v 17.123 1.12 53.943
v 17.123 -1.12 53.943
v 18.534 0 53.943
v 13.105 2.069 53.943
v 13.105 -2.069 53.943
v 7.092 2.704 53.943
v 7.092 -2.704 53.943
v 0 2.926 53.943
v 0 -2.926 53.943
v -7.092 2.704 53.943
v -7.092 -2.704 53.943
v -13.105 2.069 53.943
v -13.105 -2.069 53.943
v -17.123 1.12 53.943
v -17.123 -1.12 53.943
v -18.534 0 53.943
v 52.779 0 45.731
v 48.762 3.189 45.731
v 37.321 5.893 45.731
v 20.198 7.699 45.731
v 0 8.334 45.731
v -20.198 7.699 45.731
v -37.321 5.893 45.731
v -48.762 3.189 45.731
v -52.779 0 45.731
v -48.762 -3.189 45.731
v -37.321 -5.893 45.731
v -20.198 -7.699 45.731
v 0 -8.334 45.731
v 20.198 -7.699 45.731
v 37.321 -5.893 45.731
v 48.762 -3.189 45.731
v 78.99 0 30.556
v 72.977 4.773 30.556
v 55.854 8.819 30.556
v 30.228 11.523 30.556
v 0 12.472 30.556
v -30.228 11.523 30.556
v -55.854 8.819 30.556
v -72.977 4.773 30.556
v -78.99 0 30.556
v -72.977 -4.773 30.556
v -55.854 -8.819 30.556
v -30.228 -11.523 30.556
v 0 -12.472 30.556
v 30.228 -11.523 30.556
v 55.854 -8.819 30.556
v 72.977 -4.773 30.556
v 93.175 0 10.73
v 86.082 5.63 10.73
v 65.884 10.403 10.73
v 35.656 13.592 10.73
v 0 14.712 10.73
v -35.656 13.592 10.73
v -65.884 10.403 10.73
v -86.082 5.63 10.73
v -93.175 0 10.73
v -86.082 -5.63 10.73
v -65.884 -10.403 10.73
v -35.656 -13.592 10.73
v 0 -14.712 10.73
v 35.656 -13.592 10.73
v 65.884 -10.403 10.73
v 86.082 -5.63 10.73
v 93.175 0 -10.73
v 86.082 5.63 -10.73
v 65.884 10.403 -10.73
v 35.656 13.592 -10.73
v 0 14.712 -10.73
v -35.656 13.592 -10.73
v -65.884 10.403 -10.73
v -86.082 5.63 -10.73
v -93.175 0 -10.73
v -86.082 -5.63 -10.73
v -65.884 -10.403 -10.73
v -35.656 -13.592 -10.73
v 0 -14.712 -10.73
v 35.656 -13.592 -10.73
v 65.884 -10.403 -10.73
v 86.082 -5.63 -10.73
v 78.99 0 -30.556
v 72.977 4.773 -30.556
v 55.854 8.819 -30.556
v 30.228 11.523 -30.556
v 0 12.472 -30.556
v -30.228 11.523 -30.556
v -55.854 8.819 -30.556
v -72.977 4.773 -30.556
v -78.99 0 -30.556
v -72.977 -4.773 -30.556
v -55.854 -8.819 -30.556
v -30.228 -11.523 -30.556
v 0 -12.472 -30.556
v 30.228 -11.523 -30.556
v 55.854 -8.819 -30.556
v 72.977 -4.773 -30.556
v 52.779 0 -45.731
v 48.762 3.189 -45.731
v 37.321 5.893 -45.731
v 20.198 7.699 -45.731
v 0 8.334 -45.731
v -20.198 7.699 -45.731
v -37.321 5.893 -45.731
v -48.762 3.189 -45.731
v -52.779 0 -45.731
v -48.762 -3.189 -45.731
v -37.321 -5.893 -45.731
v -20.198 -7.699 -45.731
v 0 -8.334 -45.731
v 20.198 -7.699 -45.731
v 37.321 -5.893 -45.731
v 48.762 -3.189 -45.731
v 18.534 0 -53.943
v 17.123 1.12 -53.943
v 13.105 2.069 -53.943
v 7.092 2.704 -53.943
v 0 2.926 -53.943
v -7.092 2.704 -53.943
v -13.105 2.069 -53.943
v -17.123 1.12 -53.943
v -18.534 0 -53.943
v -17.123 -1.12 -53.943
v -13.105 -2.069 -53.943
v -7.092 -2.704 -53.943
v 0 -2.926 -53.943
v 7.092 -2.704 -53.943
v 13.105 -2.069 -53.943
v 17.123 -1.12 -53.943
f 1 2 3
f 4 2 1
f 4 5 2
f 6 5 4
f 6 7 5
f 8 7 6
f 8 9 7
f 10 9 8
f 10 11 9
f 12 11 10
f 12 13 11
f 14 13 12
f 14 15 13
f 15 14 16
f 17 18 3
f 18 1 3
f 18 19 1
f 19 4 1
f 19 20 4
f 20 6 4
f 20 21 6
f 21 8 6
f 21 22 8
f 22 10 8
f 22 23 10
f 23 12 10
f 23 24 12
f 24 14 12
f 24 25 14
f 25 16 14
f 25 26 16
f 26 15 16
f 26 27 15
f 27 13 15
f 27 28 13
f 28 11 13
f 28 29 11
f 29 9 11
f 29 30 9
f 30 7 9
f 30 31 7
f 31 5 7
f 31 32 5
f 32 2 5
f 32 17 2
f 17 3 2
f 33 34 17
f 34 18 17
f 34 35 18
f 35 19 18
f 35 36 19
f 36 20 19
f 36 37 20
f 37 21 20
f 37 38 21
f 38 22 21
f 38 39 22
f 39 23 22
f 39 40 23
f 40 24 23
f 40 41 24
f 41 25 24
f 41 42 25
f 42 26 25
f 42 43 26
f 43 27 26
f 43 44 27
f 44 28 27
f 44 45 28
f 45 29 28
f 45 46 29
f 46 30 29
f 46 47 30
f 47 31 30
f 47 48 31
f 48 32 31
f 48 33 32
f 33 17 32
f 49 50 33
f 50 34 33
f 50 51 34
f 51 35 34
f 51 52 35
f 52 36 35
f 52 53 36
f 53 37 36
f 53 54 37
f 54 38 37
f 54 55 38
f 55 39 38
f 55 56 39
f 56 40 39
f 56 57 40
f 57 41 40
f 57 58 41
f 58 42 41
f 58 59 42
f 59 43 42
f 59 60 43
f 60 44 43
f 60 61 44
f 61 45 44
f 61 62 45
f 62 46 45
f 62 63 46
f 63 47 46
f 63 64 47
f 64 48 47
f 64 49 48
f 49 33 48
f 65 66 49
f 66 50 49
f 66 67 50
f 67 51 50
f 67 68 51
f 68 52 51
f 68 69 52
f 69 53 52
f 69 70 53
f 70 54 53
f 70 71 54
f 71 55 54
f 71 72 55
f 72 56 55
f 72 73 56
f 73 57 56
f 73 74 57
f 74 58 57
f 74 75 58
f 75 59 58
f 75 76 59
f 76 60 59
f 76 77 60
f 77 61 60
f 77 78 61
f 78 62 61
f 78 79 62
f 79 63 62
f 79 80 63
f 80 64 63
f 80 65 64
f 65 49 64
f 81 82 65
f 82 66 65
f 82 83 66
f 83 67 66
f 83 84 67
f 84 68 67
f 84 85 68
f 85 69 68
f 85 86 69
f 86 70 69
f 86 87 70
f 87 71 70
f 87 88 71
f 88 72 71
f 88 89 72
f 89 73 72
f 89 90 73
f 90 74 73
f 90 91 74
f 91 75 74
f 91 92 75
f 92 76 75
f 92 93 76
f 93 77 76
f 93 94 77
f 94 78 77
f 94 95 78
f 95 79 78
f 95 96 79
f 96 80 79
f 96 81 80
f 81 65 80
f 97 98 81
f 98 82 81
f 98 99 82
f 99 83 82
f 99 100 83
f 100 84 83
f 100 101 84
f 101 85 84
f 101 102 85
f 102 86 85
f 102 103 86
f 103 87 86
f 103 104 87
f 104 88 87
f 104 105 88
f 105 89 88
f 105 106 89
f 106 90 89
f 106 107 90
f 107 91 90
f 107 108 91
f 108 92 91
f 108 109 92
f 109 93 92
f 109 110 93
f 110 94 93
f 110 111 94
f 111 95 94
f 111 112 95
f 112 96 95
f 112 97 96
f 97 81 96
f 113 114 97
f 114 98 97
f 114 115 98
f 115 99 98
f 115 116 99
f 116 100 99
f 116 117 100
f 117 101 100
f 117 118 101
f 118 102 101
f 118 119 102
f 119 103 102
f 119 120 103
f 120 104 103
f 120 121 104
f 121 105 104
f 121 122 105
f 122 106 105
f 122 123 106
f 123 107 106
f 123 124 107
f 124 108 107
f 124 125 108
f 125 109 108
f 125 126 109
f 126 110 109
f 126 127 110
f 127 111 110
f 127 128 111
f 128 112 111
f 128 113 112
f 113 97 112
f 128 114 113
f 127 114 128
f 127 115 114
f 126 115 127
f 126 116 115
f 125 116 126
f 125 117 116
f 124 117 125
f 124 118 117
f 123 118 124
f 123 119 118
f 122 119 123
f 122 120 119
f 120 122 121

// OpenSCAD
// Generated by SolidPython 1.0.1 on 2020-07-29 00:46:53


scale(v = [19, 3, 11]) {
	sphere(r = 5);
}
/***********************************************
*********      SolidPython code:      **********
************************************************
 
# import packages: SolidPython
from solid import *
from solid.utils import *
from itertools import chain, combinations, permutations


class Resize:

    def __init__(self, scad_file):
        self.scad_file = scad_file
        #self.scad_file = import_scad(scad_file)
        # cone/cylinder param:
        self.r1 = 0
        self.r2 = 0
        self.h = 0
        # rectangular prism param:
        self.w = 0
        self.l = 0
        # ellipse param:
        self.r = 0

    # import OpenScad code (file name corresponds to shape)


    # classify shape + parameters
    def assign(self, param1, param2, param3):
        if self.scad_file == 'cone.scad':
            self.r1 = param1
            self.r2 = param2
            self.h = param3
        elif self.scad_file == 'cylinder.scad':
            self.r1 = param1
            self.r2 = param2
            self.h = param3
        elif self.scad_file == 'rectangularPrism.scad':
            self.h = param1
            self.l = param2
            self.w = param3
        else:
            self.r = param1
            self.h = param2

    # resize parameters
    def iterate(self):
        x = range(3, 20, 2)
        i = 1
        if self.scad_file == 'cone.scad':
            tempList = list(permutations(x, 2))
            for temp in tempList:
                param1 = temp[0]
                param2 = temp[1]
                filepath = 'produced_scad_files/' + 'cone' + str(param1) + '_' + str(param2) + '_' + '.scad'
                scad_render_to_file(cylinder(h=param1, r1=param2, r2=0), filepath)

        elif self.scad_file == 'cylinder.scad':
            tempList = list(permutations(x, 3))
            for temp in tempList:
                param1 = temp[0]
                param2 = temp[1]
                filepath = 'produced_scad_files/' + 'cylinder' + str(param1) + '_' + str(param2) + '_' + '.scad'
                scad_render_to_file(cylinder(h=param1, r1=param2, r2=param2), filepath)

        elif self.scad_file == 'rectangularPrism.scad':
            tempList = list(permutations(x, 3))
            for temp in tempList:
                param1 = temp[0]
                param2 = temp[1]
                param3 = temp[2]
                filepath = 'produced_scad_files/' + 'rectangularPrism' + str(param1) + '_' + str(param2) + '_' + str(
                    param3) + '.scad'
                scad_render_to_file(cube(size=(param1, param2, param3)), filepath)

        elif self.scad_file == 'ellipse.scad':
            tempList = list(permutations(x, 4))
            for temp in tempList:
                param1 = temp[0]
                param2 = temp[1]
                param3 = temp[2]
                param4 = temp[3]
                filepath = 'produced_scad_files/' + 'ellipse' + str(param1) + '_' + str(param2) + '_' + str(param3) + '_' + str(param4) + '.scad'
                scad_render_to_file(scale([param1, param2, param3])(sphere(r=param4)), filepath)

    def render_to_scadfile(self):
        scad_render_to_file(scad, 'example.scad') 
 
************************************************/
